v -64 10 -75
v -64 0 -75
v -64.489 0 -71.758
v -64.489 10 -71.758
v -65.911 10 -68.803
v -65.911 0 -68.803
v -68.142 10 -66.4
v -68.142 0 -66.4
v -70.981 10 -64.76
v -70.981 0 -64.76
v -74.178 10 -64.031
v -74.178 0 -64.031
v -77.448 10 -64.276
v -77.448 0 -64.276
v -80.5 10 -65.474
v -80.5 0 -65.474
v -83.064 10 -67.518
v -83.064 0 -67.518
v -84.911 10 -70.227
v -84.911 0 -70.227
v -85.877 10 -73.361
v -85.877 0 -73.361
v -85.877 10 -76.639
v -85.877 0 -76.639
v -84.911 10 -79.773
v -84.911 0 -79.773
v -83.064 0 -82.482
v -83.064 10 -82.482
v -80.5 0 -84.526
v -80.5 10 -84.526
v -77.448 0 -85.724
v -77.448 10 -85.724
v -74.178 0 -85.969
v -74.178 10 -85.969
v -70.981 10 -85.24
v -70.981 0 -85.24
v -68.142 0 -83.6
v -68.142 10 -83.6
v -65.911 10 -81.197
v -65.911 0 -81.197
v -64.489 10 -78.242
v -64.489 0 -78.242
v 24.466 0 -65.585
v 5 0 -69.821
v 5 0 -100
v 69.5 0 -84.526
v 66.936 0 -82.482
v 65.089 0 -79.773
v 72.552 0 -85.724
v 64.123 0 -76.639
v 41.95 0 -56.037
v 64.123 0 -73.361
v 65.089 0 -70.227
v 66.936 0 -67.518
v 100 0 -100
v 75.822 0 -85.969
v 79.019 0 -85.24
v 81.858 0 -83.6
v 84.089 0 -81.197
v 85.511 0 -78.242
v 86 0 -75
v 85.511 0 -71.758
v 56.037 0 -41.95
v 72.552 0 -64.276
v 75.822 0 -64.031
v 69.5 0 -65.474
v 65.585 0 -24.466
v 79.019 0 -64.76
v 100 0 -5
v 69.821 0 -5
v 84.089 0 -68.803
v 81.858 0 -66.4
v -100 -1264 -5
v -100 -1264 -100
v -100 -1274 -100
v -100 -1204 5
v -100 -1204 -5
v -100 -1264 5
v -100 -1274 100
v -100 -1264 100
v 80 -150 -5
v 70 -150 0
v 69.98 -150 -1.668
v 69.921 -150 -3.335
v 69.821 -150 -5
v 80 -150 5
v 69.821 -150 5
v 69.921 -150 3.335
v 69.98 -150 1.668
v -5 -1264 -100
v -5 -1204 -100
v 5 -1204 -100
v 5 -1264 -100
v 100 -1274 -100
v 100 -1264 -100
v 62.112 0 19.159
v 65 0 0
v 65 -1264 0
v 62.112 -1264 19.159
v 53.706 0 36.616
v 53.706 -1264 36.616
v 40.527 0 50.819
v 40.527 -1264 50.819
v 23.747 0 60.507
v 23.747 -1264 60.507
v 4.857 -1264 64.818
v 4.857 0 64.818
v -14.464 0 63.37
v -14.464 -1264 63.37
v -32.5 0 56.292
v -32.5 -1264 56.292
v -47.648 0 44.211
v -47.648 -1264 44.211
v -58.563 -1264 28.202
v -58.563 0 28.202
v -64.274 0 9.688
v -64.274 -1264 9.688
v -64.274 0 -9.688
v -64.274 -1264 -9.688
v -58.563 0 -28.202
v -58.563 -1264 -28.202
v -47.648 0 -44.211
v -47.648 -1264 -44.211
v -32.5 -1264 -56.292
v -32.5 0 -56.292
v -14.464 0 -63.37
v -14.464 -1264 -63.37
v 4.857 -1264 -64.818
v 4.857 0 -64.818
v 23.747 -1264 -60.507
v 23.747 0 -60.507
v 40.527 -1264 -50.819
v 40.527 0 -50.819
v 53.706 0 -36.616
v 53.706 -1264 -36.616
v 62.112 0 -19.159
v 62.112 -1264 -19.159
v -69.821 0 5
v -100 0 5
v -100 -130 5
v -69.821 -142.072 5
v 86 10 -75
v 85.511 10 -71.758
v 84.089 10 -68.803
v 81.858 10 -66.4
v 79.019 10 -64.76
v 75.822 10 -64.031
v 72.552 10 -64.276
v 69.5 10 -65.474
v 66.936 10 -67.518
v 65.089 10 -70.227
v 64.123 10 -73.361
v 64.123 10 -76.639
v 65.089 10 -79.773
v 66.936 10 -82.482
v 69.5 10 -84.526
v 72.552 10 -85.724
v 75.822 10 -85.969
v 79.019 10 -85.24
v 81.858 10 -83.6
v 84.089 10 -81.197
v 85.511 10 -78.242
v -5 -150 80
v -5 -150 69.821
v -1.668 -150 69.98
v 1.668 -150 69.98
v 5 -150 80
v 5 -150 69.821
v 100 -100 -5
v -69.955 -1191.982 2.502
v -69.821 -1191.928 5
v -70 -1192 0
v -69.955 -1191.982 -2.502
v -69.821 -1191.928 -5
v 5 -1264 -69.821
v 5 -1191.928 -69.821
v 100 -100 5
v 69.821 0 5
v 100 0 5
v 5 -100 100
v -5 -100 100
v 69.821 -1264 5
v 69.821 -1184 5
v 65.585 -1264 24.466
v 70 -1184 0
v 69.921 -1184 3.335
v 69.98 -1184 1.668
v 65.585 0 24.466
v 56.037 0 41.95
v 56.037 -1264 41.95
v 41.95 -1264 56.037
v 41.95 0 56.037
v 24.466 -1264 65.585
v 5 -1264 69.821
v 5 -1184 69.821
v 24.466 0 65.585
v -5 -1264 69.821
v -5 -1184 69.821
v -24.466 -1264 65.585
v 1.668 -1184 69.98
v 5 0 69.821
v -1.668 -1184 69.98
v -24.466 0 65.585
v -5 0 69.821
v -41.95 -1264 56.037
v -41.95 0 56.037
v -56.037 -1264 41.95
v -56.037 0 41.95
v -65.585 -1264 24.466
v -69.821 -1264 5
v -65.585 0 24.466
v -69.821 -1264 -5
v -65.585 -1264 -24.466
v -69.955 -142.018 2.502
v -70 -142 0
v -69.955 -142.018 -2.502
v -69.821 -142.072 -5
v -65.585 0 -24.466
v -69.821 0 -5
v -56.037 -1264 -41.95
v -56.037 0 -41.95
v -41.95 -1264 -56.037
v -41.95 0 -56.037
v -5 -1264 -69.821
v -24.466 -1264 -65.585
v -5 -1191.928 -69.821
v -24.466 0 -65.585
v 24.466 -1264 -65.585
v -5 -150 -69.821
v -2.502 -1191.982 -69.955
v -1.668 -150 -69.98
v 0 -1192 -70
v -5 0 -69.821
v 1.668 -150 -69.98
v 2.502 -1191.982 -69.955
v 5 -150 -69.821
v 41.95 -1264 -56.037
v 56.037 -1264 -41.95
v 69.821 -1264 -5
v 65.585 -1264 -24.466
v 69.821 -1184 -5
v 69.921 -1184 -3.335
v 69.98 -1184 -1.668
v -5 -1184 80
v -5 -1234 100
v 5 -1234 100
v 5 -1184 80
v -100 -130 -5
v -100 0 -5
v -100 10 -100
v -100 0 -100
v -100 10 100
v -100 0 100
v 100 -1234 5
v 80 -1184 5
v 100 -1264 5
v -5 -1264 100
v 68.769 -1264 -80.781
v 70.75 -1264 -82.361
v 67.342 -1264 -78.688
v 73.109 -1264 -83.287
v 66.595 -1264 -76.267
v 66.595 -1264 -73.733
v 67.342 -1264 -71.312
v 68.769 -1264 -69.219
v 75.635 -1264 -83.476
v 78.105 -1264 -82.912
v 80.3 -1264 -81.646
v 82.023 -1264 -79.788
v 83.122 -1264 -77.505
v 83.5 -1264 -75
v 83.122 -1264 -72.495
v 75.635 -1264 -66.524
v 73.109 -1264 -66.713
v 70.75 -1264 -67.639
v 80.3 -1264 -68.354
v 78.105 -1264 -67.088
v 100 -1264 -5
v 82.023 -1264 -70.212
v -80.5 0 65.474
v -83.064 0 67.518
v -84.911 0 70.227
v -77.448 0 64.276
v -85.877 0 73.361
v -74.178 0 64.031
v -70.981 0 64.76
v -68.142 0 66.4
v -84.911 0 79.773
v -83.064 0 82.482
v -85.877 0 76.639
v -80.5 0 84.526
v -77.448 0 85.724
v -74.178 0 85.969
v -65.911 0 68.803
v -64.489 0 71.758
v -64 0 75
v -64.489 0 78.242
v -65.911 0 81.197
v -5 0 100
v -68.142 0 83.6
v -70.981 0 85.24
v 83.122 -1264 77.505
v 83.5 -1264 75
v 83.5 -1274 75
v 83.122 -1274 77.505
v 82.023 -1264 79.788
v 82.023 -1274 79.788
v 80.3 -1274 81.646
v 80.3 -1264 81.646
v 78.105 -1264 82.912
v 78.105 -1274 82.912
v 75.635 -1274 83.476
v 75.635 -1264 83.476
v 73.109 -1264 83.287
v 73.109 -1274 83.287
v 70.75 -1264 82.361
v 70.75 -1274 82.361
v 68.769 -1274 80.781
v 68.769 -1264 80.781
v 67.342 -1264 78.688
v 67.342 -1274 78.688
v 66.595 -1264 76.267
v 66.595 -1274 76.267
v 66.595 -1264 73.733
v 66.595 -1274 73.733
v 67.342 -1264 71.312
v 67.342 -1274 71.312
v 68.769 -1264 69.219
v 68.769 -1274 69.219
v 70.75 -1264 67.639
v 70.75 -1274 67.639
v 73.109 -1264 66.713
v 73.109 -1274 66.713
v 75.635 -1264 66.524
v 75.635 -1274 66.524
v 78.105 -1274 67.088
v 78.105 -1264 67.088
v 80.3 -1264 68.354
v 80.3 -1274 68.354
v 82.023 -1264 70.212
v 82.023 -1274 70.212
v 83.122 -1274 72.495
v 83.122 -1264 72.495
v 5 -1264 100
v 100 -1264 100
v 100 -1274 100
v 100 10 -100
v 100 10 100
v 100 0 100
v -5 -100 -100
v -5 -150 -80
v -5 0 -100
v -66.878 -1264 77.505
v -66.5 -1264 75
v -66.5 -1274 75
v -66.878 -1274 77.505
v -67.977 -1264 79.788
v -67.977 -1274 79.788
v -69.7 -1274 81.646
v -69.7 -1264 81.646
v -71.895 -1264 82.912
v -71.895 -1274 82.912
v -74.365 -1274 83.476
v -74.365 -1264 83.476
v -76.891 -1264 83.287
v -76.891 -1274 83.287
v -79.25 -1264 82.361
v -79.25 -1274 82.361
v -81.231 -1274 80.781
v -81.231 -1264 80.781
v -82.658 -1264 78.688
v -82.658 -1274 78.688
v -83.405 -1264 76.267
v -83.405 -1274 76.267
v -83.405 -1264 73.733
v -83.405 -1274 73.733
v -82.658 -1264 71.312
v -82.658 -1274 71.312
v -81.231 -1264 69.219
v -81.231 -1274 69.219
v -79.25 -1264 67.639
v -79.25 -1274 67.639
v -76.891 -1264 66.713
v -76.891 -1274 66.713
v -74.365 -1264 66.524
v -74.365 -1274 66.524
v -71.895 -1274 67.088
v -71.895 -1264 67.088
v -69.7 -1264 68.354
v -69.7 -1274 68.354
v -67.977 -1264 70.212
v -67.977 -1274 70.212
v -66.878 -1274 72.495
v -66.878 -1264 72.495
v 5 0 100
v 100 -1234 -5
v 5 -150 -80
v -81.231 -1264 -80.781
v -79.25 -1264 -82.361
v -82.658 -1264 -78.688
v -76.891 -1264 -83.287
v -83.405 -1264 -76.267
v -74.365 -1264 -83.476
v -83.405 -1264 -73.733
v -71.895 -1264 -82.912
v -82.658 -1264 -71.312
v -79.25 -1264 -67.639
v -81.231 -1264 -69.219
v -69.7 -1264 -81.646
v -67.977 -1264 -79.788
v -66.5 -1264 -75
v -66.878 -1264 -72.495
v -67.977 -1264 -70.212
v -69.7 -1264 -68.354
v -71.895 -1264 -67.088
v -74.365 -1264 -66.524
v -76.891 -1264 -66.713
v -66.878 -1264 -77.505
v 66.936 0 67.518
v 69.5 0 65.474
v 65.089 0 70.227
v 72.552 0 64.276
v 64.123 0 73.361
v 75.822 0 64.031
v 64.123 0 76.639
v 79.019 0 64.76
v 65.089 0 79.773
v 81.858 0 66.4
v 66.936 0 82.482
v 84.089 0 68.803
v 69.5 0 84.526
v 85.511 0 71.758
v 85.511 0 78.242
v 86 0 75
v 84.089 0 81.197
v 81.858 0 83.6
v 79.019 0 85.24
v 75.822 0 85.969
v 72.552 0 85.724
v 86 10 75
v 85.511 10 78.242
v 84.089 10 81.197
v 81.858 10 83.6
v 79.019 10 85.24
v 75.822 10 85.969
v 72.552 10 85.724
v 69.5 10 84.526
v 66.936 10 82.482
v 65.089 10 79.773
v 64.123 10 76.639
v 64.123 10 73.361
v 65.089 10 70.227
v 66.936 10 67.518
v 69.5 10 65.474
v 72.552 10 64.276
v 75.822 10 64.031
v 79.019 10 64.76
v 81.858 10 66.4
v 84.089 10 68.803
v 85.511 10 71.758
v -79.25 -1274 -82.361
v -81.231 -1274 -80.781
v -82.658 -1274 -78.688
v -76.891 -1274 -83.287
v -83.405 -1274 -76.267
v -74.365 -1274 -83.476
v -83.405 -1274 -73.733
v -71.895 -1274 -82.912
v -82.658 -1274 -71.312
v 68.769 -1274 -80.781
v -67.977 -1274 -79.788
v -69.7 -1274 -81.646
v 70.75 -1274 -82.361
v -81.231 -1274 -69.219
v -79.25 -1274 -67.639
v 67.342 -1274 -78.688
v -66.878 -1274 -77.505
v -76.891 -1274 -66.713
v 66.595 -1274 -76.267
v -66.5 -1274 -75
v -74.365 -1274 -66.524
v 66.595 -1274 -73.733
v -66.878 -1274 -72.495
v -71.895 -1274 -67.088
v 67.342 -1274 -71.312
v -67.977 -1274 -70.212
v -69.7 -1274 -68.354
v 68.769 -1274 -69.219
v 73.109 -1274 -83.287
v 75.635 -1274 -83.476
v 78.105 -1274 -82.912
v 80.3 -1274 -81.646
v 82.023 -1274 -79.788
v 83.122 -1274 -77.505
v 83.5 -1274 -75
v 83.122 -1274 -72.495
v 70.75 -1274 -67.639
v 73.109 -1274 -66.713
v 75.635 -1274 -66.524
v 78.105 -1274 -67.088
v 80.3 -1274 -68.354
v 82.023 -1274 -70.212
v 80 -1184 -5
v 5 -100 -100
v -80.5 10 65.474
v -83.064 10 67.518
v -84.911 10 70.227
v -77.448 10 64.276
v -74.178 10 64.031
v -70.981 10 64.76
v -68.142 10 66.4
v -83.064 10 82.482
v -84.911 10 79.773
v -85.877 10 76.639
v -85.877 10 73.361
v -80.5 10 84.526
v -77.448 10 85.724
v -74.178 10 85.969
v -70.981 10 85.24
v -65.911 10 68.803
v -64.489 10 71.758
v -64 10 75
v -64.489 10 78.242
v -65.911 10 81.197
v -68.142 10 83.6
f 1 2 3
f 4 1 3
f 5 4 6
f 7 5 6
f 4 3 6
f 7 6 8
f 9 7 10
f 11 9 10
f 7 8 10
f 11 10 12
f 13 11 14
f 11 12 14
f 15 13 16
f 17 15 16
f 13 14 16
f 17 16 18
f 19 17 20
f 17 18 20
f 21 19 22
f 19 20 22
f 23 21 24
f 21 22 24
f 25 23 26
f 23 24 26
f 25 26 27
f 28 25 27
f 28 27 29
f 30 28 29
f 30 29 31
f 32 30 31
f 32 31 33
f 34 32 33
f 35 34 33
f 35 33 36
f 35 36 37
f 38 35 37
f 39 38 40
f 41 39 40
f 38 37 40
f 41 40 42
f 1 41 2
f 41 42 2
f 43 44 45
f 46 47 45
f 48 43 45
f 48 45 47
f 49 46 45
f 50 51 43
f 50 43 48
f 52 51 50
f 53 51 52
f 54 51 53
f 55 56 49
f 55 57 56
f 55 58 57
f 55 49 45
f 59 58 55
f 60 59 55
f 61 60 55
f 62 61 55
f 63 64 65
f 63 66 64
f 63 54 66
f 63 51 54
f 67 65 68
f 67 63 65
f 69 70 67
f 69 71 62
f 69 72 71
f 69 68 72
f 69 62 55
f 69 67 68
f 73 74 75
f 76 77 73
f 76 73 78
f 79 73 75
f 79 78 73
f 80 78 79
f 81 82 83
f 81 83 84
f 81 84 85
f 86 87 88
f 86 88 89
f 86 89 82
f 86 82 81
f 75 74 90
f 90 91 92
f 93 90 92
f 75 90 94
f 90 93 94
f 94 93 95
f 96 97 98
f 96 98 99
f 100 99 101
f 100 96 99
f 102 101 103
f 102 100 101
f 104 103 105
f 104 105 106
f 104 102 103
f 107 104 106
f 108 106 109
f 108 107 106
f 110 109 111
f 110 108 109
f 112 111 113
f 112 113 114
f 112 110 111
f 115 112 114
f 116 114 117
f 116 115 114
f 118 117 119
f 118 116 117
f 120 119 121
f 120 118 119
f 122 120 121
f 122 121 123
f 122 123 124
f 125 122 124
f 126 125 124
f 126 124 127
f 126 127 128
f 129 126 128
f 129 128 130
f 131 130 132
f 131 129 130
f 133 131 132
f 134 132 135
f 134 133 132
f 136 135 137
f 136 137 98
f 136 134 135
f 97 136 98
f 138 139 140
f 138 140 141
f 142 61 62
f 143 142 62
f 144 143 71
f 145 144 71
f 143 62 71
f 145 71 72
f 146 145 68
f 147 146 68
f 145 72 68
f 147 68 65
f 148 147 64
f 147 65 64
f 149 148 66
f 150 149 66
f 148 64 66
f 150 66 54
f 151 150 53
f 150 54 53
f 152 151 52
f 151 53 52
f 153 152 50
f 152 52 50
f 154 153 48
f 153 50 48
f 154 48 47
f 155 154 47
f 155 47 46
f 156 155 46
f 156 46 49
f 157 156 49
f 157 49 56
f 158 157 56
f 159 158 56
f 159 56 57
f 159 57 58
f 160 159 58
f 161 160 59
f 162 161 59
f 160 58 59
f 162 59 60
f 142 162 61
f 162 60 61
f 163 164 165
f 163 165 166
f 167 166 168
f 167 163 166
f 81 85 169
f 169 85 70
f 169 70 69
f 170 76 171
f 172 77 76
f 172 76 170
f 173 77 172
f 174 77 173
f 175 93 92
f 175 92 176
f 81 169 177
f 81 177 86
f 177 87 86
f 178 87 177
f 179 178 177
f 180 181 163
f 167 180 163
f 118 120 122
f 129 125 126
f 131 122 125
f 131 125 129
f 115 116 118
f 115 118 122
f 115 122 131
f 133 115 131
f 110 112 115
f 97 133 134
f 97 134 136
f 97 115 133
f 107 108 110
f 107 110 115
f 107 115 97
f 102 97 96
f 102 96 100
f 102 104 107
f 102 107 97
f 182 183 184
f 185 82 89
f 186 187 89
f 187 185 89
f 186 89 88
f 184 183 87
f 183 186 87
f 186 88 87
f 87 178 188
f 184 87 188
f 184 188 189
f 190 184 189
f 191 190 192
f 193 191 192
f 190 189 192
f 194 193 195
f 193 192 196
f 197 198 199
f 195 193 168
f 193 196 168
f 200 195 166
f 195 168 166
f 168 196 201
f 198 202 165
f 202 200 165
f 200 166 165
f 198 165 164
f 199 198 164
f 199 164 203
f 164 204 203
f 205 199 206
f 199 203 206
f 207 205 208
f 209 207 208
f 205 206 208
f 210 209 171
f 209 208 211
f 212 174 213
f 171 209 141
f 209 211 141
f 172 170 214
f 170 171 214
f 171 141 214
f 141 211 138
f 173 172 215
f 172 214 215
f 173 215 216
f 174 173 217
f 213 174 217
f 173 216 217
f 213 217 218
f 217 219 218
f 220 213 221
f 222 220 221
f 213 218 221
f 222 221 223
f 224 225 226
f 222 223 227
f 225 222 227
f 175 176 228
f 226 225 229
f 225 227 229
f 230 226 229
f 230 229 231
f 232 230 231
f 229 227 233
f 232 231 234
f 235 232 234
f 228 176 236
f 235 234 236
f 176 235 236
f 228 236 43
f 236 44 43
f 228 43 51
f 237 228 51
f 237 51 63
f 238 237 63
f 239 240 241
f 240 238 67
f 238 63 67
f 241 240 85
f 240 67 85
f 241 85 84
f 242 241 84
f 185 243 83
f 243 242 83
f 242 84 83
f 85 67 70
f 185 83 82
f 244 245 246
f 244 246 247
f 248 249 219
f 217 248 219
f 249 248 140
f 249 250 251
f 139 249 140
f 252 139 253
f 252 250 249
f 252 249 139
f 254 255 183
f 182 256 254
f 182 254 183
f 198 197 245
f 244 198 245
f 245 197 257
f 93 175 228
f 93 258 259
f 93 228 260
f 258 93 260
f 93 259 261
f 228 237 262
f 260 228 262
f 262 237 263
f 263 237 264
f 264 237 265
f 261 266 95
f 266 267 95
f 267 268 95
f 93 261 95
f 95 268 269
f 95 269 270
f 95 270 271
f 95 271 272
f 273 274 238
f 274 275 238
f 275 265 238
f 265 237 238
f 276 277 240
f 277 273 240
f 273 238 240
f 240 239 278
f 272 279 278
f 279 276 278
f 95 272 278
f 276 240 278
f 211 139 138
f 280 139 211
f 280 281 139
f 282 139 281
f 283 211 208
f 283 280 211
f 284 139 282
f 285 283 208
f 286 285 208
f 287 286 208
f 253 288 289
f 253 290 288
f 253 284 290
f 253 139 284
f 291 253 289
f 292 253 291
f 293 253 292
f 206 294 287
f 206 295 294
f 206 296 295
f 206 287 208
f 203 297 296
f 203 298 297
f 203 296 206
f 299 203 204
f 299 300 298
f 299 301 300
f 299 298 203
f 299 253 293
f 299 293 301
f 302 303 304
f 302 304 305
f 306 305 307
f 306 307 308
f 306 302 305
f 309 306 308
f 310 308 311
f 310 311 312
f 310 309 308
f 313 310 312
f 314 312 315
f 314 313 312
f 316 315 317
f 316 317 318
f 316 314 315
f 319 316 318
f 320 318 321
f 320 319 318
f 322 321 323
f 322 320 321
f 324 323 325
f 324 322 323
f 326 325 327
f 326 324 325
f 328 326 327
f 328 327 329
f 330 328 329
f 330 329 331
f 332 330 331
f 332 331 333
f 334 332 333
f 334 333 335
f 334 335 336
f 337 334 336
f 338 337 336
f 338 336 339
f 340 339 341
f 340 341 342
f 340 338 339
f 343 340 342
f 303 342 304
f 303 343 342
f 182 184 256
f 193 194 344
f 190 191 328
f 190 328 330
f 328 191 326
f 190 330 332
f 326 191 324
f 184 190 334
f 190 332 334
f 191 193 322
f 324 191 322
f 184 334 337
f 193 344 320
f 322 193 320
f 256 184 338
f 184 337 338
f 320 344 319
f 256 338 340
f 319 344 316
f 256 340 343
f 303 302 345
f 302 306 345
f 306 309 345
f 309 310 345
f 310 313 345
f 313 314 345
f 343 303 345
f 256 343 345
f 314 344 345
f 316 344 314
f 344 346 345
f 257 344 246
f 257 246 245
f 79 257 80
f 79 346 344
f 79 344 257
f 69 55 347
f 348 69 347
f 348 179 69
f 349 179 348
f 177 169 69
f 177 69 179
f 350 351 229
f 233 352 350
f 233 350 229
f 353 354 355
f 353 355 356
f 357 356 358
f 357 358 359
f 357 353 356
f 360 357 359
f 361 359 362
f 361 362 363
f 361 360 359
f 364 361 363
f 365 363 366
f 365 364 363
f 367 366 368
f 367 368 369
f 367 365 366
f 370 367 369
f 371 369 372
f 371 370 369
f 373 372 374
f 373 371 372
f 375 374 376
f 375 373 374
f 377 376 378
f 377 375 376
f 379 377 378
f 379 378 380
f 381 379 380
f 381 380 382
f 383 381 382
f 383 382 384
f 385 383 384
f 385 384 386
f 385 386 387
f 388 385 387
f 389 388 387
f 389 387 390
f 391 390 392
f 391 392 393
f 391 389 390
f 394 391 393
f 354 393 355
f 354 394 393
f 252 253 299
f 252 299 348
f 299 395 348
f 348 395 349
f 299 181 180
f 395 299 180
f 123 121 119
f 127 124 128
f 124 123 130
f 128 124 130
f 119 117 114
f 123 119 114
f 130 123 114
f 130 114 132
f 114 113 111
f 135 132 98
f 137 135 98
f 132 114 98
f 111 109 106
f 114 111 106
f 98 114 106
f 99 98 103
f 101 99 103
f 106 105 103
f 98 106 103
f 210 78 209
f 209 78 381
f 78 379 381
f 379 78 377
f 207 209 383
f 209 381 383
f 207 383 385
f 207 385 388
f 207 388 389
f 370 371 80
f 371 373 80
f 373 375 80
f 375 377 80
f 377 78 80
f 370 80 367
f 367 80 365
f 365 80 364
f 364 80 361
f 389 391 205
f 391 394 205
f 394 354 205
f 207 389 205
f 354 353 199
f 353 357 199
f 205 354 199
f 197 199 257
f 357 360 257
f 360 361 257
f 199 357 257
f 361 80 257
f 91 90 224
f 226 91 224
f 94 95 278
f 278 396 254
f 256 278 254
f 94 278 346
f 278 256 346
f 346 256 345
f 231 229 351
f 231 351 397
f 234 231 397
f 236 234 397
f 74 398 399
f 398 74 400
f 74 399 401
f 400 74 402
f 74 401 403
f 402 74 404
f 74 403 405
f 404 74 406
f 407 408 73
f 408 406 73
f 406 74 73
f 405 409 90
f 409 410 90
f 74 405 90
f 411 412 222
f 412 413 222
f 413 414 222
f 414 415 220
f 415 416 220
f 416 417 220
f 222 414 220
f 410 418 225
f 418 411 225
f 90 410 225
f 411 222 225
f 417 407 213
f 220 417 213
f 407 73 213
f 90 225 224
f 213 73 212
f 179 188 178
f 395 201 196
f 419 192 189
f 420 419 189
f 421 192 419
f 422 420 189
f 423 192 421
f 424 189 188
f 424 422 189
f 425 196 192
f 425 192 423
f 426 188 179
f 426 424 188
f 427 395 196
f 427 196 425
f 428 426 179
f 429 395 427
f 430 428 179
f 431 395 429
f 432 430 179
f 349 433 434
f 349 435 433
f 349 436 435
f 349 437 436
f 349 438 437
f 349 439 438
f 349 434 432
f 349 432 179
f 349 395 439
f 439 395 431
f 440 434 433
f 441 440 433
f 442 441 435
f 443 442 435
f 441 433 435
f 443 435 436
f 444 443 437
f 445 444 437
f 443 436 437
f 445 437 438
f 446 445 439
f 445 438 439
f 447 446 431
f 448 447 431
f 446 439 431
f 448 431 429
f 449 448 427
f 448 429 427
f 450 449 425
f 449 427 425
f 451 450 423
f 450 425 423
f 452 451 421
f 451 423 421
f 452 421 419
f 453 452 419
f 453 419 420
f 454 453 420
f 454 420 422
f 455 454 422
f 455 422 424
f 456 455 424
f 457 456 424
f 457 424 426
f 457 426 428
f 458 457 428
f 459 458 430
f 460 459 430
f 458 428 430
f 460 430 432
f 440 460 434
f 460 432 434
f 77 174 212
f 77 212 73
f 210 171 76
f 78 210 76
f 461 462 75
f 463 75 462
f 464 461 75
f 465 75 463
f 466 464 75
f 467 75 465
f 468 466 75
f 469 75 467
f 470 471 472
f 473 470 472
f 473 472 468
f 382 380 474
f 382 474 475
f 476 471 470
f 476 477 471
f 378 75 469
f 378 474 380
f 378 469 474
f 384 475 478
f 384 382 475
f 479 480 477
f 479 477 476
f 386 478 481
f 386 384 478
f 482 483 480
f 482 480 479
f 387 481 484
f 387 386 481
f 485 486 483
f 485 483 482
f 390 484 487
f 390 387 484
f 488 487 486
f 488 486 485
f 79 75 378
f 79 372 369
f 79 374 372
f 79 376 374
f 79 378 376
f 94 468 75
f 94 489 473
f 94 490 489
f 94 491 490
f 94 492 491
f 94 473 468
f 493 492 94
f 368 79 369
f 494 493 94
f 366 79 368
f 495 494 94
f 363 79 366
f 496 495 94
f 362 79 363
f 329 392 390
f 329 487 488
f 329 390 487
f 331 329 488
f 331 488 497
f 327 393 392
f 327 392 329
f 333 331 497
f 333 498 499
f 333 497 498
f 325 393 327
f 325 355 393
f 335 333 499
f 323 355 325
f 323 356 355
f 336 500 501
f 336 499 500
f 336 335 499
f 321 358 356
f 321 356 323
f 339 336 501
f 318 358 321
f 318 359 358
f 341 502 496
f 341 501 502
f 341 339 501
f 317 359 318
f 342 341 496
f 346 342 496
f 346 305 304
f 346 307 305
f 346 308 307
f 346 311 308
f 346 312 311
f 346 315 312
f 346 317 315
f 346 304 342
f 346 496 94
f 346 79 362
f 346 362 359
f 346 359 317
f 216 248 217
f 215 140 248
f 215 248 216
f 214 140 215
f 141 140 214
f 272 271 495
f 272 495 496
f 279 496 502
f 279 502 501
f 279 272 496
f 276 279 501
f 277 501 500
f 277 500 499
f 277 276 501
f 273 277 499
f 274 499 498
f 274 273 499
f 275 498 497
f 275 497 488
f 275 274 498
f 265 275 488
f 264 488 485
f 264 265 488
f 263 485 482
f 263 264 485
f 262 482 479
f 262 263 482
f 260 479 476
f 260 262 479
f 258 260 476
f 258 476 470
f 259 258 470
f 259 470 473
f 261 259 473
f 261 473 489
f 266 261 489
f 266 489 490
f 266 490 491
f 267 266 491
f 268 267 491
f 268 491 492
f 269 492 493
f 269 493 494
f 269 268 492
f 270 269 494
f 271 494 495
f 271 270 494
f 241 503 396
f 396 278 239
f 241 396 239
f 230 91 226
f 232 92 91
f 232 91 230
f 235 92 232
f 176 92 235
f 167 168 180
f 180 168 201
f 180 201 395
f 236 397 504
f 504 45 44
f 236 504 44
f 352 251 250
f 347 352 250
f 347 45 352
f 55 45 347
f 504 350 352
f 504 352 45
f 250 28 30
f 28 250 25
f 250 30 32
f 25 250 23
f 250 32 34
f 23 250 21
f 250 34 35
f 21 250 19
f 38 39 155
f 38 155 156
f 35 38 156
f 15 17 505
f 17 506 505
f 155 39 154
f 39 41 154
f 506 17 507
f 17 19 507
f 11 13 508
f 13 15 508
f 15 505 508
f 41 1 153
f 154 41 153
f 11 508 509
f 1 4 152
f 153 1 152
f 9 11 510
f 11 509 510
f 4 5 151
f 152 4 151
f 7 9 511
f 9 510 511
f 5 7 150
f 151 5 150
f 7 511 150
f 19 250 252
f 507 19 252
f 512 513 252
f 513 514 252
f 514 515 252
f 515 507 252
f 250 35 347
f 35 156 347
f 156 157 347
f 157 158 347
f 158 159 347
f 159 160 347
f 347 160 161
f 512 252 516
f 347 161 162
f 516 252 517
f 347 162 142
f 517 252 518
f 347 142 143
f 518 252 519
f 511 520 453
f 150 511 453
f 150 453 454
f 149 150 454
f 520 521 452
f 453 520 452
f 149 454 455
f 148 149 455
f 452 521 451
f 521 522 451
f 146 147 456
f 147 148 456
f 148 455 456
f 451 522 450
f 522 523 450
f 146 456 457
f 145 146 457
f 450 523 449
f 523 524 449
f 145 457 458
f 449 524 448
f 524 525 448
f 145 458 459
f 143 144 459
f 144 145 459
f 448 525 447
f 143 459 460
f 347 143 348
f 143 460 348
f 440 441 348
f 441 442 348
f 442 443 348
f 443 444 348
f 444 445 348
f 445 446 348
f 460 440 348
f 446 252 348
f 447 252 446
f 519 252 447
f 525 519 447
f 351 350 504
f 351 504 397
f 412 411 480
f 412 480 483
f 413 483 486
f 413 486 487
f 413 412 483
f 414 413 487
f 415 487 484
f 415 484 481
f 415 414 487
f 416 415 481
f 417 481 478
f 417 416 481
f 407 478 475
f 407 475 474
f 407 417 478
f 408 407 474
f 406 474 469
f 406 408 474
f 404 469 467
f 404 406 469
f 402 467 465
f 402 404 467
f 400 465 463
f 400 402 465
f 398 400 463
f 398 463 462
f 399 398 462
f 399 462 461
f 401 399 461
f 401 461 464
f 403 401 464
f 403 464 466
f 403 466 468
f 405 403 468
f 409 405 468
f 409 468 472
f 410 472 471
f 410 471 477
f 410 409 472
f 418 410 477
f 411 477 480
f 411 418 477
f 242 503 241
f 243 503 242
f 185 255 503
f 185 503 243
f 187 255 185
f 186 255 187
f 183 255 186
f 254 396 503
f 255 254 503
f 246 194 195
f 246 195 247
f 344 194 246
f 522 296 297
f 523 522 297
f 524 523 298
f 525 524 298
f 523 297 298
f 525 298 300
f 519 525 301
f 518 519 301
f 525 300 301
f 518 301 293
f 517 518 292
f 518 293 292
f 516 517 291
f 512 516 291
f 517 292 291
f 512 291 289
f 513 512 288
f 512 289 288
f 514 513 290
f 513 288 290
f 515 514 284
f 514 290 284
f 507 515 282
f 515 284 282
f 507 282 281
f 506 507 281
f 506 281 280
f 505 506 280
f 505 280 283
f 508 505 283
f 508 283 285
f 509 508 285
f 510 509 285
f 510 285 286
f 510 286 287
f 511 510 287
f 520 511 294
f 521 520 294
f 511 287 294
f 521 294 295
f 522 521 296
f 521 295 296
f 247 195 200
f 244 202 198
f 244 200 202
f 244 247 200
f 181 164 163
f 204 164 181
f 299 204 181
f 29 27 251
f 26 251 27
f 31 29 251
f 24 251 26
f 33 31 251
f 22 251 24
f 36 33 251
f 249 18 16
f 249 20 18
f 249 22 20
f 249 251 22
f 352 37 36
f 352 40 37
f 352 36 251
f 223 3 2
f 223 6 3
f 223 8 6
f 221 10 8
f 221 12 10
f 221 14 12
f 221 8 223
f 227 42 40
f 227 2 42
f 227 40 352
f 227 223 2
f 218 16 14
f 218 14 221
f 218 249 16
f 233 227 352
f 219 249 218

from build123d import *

# Parameters (mm, degrees)
F0_R          = 70
F0_R_2        = 65
F1_DEPTH      = 1264
F2_W          = 200
F2_H          = 200
F2_R          = 11
F3_DEPTH      = 10
F4_W          = 30.1787997812
F4_H          = 10
F4_W_2        = 10
F4_H_2        = 30.1787997812
F5_DEPTH      = 150
F6_T1_DEPTH   = 269.311363913
F6_T3_DEPTH   = 269.311363913
F6_T8_DEPTH   = 269.311363913
F6_S9_R       = 70
F6_T10_DEPTH  = 139
F8_W          = 200
F8_H          = 200
F8_R          = 8.5
F9_DEPTH      = 10
F10_W         = 10
F10_H         = 30.1787997812
F10_W_2       = 30.1787997812
F10_H_2       = 10
F11_DEPTH     = 80
F12_T1_DEPTH  = 269.311363913
F12_T3_DEPTH  = 269.311363913
F12_T8_DEPTH  = 269.311363913
F12_S9_R      = 70
F12_T10_DEPTH = 139
F12_T14_DEPTH = 269.311363913
F12_S15_R     = 70
F12_T16_DEPTH = 139


# Not quite as in the source:
# - a fillet or chamfer that OpenCascade refuses, or shapes differently, is made with other operations: its cross-section is extruded or revolved along the edge and cut away or added


with BuildPart() as f1:
    # F0 (on Front) → F1 (new body)
    with BuildSketch(Plane.XZ):
        Circle(F0_R)
        Circle(F0_R_2, mode=Mode.SUBTRACT)
    extrude(amount=F1_DEPTH)

    # F2 (on Front) → F3 (join)
    with BuildSketch(Plane.XZ):
        Rectangle(F2_W, F2_H)
        with Locations((-75, -75)):
            Circle(F2_R, mode=Mode.SUBTRACT)
        with Locations((75, -75)):
            Circle(F2_R, mode=Mode.SUBTRACT)
        with Locations((-75, 75)):
            Circle(F2_R, mode=Mode.SUBTRACT)
        with Locations((75, 75)):
            Circle(F2_R, mode=Mode.SUBTRACT)
    extrude(amount=-F3_DEPTH)

    # F4 (on Front) → F5 (join)
    with BuildSketch(Plane.XZ):
        with Locations((-84.9106001094, 0)):
            Rectangle(F4_W, F4_H)
        with Locations((0, 84.9106001094)):
            Rectangle(F4_W_2, F4_H_2)
        with Locations((84.9106001094, 0)):
            Rectangle(F4_W, F4_H)
        with Locations((0, -84.9106001094)):
            Rectangle(F4_W_2, F4_H_2)
    extrude(amount=F5_DEPTH)

    # F6: chamfer of 50 x 20 on 4 edges, made by hand

    # F6_s2 → F6_t1 (cut)
    with BuildSketch(Plane.YZ.offset(-134.6556819565)):
        Polygon((-100, 100), (-150, 80), (-150, 100), align=None)
        Polygon((-100, -100), (-150, -80), (-150, -100), align=None)
    extrude(amount=F6_T1_DEPTH, mode=Mode.SUBTRACT)

    # F6_s4 → F6_t3 (cut)
    with BuildSketch(Plane.XY.offset(-134.6556819565)):
        Polygon((100, -100), (80, -150), (100, -150), align=None)
    extrude(amount=F6_T3_DEPTH, mode=Mode.SUBTRACT)


with BuildPart() as f6_tool6:
    # F6_s7 → F6_t8 (new body)
    with BuildSketch(Plane.XY.offset(134.6556819565)):
        Polygon((-100, -130), (-50, -150), (-100, -150), align=None)
    extrude(amount=-F6_T8_DEPTH)

    # F6_s9 → F6_t10 (cut, symmetric)
    with BuildSketch(Plane.XZ.offset(140)):
        Circle(F6_S9_R)
    extrude(amount=F6_T10_DEPTH, both=True, mode=Mode.SUBTRACT)


with BuildPart() as f1_1:
    add(f1.part)

    # F6_t5: cut F6_tool6
    add(f6_tool6.part, mode=Mode.SUBTRACT)

    # F8 (on offset) → F9 (join)
    with BuildSketch(Plane.XZ.offset(1264)):
        Rectangle(F8_W, F8_H)
        with Locations((-75, -75)):
            Circle(F8_R, mode=Mode.SUBTRACT)
        with Locations((75, -75)):
            Circle(F8_R, mode=Mode.SUBTRACT)
        with Locations((-75, 75)):
            Circle(F8_R, mode=Mode.SUBTRACT)
        with Locations((75, 75)):
            Circle(F8_R, mode=Mode.SUBTRACT)
    extrude(amount=F9_DEPTH)

    # F10 (on face) → F11 (join)
    with BuildSketch(Plane(origin=(0, -1264, 0), x_dir=(-1, 0, 0), z_dir=(0, 1, 0))):
        with Locations((0, 84.9106001094)):
            Rectangle(F10_W, F10_H)
        with Locations((84.9106001094, 0)):
            Rectangle(F10_W_2, F10_H_2)
        with Locations((0, -84.9106001094)):
            Rectangle(F10_W, F10_H)
        with Locations((-84.9106001094, 0)):
            Rectangle(F10_W_2, F10_H_2)
    extrude(amount=F11_DEPTH)

    # F12: chamfer of 20 x 50 on 4 edges, made by hand

    # F12_s2 → F12_t1 (cut)
    with BuildSketch(Plane.YZ.offset(-134.6556819565)):
        Polygon((-1234, 100), (-1184, 80), (-1184, 100), align=None)
    extrude(amount=F12_T1_DEPTH, mode=Mode.SUBTRACT)

    # F12_s4 → F12_t3 (cut)
    with BuildSketch(Plane.XY.offset(-134.6556819565)):
        Polygon((100, -1234), (80, -1184), (100, -1184), align=None)
    extrude(amount=F12_T3_DEPTH, mode=Mode.SUBTRACT)


with BuildPart() as f12_tool6:
    # F12_s7 → F12_t8 (new body)
    with BuildSketch(Plane.XY.offset(-134.6556819565)):
        Polygon((-100, -1204), (-50, -1184), (-100, -1184), align=None)
    extrude(amount=F12_T8_DEPTH)

    # F12_s9 → F12_t10 (cut, symmetric)
    with BuildSketch(Plane.XZ.offset(1194)):
        Circle(F12_S9_R)
    extrude(amount=F12_T10_DEPTH, both=True, mode=Mode.SUBTRACT)


with BuildPart() as f1_2:
    add(f1_1.part)

    # F12_t5: cut F12_tool6
    add(f12_tool6.part, mode=Mode.SUBTRACT)


with BuildPart() as f12_tool12:
    # F12_s13 → F12_t14 (new body)
    with BuildSketch(Plane.YZ.offset(134.6556819565)):
        Polygon((-1204, -100), (-1184, -50), (-1184, -100), align=None)
    extrude(amount=-F12_T14_DEPTH)

    # F12_s15 → F12_t16 (cut, symmetric)
    with BuildSketch(Plane.XZ.offset(1194)):
        Circle(F12_S15_R)
    extrude(amount=F12_T16_DEPTH, both=True, mode=Mode.SUBTRACT)


with BuildPart() as f1_3:
    add(f1_2.part)

    # F12_t11: cut F12_tool12
    add(f12_tool12.part, mode=Mode.SUBTRACT)


solid = f1_3.part
